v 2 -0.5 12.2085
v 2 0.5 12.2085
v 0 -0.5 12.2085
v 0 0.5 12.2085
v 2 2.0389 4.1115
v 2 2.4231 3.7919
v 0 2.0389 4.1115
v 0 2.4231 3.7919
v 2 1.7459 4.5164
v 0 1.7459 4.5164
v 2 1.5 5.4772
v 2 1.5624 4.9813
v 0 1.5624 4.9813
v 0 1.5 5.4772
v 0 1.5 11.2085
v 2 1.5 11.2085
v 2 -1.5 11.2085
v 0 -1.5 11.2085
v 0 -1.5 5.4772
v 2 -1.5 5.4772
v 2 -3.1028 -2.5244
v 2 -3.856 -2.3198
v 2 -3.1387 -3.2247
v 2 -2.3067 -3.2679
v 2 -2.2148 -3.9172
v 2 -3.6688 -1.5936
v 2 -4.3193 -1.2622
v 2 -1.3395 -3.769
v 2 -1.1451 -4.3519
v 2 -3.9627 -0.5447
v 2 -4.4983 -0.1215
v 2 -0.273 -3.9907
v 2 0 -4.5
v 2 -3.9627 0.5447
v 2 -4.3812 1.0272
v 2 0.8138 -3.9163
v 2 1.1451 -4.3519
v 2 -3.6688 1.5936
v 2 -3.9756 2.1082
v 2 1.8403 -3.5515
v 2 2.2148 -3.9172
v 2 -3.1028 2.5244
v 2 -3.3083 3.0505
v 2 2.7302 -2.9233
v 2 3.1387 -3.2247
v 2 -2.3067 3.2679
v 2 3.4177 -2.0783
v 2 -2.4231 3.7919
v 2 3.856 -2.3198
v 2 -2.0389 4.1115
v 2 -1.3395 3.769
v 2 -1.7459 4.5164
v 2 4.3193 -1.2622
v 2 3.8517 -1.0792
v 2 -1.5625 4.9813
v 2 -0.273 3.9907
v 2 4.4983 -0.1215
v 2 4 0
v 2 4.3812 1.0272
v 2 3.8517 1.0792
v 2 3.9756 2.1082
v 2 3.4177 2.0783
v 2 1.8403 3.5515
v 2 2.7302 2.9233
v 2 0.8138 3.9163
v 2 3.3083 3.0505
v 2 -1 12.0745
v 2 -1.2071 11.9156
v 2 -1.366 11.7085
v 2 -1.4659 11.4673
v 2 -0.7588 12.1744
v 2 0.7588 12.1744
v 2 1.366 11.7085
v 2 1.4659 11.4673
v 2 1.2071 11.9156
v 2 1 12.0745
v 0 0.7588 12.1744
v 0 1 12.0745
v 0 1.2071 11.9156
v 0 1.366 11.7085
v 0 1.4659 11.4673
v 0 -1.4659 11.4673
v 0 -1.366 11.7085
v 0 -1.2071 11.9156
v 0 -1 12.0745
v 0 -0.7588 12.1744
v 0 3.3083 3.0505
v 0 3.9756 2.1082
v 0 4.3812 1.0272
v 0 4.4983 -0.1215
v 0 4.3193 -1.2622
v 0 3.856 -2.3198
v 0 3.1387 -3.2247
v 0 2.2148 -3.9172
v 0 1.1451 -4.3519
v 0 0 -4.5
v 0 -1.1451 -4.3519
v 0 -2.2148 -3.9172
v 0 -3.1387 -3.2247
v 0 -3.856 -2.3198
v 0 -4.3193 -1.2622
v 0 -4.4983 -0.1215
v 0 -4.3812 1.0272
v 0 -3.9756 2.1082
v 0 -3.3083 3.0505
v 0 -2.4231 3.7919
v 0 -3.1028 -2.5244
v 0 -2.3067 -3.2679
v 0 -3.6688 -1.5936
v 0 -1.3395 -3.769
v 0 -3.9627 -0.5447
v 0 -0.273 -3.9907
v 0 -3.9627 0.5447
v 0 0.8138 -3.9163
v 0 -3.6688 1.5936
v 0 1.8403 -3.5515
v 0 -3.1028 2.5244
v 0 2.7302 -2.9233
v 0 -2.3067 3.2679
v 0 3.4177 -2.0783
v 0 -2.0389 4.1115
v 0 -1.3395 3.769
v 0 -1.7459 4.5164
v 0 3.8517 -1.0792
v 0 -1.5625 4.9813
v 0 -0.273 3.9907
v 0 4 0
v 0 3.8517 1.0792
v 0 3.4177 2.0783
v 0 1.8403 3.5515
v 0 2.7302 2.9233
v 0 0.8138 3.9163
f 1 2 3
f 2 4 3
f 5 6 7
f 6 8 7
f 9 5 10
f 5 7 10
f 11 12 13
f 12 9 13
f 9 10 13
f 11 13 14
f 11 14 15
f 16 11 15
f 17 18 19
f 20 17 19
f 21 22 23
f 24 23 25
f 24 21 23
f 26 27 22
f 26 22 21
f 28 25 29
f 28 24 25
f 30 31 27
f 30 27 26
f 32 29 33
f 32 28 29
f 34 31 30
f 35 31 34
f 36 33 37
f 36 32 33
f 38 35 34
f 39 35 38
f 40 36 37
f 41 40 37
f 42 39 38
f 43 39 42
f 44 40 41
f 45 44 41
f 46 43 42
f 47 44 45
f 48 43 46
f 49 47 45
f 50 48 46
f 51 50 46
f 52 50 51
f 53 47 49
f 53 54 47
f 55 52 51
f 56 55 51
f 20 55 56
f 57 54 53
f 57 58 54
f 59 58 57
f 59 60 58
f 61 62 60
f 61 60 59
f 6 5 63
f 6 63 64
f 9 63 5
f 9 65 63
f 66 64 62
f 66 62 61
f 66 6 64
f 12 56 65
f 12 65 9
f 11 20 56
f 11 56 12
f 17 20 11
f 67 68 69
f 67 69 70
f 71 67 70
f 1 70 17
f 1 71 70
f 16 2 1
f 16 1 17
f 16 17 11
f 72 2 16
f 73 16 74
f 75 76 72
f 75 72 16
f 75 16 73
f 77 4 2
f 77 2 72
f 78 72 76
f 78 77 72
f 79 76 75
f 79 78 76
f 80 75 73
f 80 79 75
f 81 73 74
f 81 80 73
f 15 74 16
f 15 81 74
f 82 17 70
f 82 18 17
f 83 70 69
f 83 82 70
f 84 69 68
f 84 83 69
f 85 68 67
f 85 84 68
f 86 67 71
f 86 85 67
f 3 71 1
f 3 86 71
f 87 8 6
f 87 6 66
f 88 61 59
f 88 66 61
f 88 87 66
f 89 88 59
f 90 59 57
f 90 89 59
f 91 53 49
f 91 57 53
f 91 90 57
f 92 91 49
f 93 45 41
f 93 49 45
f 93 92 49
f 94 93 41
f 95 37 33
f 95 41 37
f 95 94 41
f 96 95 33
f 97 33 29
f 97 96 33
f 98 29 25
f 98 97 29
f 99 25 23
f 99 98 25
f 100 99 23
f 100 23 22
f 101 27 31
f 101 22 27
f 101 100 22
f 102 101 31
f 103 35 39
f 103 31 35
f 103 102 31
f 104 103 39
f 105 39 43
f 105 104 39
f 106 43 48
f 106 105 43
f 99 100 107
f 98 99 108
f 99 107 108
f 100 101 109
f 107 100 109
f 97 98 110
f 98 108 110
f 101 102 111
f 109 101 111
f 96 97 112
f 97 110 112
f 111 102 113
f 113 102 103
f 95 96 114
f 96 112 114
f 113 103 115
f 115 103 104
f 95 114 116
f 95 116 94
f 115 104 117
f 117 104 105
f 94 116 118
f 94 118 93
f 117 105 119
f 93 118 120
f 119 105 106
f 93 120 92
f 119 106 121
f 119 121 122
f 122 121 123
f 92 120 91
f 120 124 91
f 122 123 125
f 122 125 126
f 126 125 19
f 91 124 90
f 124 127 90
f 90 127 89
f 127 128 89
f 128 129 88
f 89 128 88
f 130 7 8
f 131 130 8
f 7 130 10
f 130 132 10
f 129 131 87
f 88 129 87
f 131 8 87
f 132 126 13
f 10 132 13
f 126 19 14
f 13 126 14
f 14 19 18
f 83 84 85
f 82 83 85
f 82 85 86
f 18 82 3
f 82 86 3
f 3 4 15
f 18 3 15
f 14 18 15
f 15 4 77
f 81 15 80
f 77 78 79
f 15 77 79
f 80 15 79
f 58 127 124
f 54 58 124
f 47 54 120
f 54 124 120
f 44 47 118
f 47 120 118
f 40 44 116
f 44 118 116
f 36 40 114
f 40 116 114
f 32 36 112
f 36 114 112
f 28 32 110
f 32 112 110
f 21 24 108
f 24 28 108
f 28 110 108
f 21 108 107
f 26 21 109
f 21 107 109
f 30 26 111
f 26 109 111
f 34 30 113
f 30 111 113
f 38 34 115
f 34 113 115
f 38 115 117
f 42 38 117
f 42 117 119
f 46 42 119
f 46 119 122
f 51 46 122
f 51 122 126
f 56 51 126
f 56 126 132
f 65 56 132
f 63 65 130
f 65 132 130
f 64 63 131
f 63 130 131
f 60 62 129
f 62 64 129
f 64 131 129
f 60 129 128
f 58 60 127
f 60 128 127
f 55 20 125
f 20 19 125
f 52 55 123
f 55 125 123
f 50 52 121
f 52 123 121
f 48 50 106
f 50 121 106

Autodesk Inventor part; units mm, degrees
ref_plane "YZ Plane" through (0, 0, 0) normal (1, 0, 0) x (0, 1, 0)
ref_plane "XZ Plane" through (0, 0, 0) normal (0, 1, 0) x (-1, 0, 0)
ref_plane "XY Plane" through (0, 0, 0) normal (0, 0, 1) x (1, 0, 0)
sketch "Sketch1" plane through (0, 0, 0) normal (1, 0, 0) x (0, 1, 0)
  circle A0 centre (0, 0) radius 4
  arc A1 (-2.4231, 3.7919) -> (2.4231, 3.7919) centre (0, 0) ccw
  line L0 (-1.5, 11.2085) -> (-1.5, 5.4772)
  line L1 (1.5, 5.4772) -> (1.5, 11.2085)
  arc A2 (1.5, 5.4772) -> (2.4231, 3.7919) centre (3.5, 5.4772) ccw
  arc A3 (-2.4231, 3.7919) -> (-1.5, 5.4772) centre (-3.5, 5.4772) ccw
  line L2 (0.5, 12.2085) -> (-0.5, 12.2085)
  arc A4 (1.5, 11.2085) -> (0.5, 12.2085) centre (0.5, 11.2085) ccw
  arc A5 (-0.5, 12.2085) -> (-1.5, 11.2085) centre (-0.5, 11.2085) ccw
  point P0 (-1.5, 4.2426)
  point P1 (1.5, 4.2426)
  dimension "d0" = 8
  dimension "d1" = 9
  dimension "d4" = 2
  dimension "d8" = 1
extrude "Extrusion1" add sketch "Sketch1" along normal blind 2
properties part number "_3DPrint"
